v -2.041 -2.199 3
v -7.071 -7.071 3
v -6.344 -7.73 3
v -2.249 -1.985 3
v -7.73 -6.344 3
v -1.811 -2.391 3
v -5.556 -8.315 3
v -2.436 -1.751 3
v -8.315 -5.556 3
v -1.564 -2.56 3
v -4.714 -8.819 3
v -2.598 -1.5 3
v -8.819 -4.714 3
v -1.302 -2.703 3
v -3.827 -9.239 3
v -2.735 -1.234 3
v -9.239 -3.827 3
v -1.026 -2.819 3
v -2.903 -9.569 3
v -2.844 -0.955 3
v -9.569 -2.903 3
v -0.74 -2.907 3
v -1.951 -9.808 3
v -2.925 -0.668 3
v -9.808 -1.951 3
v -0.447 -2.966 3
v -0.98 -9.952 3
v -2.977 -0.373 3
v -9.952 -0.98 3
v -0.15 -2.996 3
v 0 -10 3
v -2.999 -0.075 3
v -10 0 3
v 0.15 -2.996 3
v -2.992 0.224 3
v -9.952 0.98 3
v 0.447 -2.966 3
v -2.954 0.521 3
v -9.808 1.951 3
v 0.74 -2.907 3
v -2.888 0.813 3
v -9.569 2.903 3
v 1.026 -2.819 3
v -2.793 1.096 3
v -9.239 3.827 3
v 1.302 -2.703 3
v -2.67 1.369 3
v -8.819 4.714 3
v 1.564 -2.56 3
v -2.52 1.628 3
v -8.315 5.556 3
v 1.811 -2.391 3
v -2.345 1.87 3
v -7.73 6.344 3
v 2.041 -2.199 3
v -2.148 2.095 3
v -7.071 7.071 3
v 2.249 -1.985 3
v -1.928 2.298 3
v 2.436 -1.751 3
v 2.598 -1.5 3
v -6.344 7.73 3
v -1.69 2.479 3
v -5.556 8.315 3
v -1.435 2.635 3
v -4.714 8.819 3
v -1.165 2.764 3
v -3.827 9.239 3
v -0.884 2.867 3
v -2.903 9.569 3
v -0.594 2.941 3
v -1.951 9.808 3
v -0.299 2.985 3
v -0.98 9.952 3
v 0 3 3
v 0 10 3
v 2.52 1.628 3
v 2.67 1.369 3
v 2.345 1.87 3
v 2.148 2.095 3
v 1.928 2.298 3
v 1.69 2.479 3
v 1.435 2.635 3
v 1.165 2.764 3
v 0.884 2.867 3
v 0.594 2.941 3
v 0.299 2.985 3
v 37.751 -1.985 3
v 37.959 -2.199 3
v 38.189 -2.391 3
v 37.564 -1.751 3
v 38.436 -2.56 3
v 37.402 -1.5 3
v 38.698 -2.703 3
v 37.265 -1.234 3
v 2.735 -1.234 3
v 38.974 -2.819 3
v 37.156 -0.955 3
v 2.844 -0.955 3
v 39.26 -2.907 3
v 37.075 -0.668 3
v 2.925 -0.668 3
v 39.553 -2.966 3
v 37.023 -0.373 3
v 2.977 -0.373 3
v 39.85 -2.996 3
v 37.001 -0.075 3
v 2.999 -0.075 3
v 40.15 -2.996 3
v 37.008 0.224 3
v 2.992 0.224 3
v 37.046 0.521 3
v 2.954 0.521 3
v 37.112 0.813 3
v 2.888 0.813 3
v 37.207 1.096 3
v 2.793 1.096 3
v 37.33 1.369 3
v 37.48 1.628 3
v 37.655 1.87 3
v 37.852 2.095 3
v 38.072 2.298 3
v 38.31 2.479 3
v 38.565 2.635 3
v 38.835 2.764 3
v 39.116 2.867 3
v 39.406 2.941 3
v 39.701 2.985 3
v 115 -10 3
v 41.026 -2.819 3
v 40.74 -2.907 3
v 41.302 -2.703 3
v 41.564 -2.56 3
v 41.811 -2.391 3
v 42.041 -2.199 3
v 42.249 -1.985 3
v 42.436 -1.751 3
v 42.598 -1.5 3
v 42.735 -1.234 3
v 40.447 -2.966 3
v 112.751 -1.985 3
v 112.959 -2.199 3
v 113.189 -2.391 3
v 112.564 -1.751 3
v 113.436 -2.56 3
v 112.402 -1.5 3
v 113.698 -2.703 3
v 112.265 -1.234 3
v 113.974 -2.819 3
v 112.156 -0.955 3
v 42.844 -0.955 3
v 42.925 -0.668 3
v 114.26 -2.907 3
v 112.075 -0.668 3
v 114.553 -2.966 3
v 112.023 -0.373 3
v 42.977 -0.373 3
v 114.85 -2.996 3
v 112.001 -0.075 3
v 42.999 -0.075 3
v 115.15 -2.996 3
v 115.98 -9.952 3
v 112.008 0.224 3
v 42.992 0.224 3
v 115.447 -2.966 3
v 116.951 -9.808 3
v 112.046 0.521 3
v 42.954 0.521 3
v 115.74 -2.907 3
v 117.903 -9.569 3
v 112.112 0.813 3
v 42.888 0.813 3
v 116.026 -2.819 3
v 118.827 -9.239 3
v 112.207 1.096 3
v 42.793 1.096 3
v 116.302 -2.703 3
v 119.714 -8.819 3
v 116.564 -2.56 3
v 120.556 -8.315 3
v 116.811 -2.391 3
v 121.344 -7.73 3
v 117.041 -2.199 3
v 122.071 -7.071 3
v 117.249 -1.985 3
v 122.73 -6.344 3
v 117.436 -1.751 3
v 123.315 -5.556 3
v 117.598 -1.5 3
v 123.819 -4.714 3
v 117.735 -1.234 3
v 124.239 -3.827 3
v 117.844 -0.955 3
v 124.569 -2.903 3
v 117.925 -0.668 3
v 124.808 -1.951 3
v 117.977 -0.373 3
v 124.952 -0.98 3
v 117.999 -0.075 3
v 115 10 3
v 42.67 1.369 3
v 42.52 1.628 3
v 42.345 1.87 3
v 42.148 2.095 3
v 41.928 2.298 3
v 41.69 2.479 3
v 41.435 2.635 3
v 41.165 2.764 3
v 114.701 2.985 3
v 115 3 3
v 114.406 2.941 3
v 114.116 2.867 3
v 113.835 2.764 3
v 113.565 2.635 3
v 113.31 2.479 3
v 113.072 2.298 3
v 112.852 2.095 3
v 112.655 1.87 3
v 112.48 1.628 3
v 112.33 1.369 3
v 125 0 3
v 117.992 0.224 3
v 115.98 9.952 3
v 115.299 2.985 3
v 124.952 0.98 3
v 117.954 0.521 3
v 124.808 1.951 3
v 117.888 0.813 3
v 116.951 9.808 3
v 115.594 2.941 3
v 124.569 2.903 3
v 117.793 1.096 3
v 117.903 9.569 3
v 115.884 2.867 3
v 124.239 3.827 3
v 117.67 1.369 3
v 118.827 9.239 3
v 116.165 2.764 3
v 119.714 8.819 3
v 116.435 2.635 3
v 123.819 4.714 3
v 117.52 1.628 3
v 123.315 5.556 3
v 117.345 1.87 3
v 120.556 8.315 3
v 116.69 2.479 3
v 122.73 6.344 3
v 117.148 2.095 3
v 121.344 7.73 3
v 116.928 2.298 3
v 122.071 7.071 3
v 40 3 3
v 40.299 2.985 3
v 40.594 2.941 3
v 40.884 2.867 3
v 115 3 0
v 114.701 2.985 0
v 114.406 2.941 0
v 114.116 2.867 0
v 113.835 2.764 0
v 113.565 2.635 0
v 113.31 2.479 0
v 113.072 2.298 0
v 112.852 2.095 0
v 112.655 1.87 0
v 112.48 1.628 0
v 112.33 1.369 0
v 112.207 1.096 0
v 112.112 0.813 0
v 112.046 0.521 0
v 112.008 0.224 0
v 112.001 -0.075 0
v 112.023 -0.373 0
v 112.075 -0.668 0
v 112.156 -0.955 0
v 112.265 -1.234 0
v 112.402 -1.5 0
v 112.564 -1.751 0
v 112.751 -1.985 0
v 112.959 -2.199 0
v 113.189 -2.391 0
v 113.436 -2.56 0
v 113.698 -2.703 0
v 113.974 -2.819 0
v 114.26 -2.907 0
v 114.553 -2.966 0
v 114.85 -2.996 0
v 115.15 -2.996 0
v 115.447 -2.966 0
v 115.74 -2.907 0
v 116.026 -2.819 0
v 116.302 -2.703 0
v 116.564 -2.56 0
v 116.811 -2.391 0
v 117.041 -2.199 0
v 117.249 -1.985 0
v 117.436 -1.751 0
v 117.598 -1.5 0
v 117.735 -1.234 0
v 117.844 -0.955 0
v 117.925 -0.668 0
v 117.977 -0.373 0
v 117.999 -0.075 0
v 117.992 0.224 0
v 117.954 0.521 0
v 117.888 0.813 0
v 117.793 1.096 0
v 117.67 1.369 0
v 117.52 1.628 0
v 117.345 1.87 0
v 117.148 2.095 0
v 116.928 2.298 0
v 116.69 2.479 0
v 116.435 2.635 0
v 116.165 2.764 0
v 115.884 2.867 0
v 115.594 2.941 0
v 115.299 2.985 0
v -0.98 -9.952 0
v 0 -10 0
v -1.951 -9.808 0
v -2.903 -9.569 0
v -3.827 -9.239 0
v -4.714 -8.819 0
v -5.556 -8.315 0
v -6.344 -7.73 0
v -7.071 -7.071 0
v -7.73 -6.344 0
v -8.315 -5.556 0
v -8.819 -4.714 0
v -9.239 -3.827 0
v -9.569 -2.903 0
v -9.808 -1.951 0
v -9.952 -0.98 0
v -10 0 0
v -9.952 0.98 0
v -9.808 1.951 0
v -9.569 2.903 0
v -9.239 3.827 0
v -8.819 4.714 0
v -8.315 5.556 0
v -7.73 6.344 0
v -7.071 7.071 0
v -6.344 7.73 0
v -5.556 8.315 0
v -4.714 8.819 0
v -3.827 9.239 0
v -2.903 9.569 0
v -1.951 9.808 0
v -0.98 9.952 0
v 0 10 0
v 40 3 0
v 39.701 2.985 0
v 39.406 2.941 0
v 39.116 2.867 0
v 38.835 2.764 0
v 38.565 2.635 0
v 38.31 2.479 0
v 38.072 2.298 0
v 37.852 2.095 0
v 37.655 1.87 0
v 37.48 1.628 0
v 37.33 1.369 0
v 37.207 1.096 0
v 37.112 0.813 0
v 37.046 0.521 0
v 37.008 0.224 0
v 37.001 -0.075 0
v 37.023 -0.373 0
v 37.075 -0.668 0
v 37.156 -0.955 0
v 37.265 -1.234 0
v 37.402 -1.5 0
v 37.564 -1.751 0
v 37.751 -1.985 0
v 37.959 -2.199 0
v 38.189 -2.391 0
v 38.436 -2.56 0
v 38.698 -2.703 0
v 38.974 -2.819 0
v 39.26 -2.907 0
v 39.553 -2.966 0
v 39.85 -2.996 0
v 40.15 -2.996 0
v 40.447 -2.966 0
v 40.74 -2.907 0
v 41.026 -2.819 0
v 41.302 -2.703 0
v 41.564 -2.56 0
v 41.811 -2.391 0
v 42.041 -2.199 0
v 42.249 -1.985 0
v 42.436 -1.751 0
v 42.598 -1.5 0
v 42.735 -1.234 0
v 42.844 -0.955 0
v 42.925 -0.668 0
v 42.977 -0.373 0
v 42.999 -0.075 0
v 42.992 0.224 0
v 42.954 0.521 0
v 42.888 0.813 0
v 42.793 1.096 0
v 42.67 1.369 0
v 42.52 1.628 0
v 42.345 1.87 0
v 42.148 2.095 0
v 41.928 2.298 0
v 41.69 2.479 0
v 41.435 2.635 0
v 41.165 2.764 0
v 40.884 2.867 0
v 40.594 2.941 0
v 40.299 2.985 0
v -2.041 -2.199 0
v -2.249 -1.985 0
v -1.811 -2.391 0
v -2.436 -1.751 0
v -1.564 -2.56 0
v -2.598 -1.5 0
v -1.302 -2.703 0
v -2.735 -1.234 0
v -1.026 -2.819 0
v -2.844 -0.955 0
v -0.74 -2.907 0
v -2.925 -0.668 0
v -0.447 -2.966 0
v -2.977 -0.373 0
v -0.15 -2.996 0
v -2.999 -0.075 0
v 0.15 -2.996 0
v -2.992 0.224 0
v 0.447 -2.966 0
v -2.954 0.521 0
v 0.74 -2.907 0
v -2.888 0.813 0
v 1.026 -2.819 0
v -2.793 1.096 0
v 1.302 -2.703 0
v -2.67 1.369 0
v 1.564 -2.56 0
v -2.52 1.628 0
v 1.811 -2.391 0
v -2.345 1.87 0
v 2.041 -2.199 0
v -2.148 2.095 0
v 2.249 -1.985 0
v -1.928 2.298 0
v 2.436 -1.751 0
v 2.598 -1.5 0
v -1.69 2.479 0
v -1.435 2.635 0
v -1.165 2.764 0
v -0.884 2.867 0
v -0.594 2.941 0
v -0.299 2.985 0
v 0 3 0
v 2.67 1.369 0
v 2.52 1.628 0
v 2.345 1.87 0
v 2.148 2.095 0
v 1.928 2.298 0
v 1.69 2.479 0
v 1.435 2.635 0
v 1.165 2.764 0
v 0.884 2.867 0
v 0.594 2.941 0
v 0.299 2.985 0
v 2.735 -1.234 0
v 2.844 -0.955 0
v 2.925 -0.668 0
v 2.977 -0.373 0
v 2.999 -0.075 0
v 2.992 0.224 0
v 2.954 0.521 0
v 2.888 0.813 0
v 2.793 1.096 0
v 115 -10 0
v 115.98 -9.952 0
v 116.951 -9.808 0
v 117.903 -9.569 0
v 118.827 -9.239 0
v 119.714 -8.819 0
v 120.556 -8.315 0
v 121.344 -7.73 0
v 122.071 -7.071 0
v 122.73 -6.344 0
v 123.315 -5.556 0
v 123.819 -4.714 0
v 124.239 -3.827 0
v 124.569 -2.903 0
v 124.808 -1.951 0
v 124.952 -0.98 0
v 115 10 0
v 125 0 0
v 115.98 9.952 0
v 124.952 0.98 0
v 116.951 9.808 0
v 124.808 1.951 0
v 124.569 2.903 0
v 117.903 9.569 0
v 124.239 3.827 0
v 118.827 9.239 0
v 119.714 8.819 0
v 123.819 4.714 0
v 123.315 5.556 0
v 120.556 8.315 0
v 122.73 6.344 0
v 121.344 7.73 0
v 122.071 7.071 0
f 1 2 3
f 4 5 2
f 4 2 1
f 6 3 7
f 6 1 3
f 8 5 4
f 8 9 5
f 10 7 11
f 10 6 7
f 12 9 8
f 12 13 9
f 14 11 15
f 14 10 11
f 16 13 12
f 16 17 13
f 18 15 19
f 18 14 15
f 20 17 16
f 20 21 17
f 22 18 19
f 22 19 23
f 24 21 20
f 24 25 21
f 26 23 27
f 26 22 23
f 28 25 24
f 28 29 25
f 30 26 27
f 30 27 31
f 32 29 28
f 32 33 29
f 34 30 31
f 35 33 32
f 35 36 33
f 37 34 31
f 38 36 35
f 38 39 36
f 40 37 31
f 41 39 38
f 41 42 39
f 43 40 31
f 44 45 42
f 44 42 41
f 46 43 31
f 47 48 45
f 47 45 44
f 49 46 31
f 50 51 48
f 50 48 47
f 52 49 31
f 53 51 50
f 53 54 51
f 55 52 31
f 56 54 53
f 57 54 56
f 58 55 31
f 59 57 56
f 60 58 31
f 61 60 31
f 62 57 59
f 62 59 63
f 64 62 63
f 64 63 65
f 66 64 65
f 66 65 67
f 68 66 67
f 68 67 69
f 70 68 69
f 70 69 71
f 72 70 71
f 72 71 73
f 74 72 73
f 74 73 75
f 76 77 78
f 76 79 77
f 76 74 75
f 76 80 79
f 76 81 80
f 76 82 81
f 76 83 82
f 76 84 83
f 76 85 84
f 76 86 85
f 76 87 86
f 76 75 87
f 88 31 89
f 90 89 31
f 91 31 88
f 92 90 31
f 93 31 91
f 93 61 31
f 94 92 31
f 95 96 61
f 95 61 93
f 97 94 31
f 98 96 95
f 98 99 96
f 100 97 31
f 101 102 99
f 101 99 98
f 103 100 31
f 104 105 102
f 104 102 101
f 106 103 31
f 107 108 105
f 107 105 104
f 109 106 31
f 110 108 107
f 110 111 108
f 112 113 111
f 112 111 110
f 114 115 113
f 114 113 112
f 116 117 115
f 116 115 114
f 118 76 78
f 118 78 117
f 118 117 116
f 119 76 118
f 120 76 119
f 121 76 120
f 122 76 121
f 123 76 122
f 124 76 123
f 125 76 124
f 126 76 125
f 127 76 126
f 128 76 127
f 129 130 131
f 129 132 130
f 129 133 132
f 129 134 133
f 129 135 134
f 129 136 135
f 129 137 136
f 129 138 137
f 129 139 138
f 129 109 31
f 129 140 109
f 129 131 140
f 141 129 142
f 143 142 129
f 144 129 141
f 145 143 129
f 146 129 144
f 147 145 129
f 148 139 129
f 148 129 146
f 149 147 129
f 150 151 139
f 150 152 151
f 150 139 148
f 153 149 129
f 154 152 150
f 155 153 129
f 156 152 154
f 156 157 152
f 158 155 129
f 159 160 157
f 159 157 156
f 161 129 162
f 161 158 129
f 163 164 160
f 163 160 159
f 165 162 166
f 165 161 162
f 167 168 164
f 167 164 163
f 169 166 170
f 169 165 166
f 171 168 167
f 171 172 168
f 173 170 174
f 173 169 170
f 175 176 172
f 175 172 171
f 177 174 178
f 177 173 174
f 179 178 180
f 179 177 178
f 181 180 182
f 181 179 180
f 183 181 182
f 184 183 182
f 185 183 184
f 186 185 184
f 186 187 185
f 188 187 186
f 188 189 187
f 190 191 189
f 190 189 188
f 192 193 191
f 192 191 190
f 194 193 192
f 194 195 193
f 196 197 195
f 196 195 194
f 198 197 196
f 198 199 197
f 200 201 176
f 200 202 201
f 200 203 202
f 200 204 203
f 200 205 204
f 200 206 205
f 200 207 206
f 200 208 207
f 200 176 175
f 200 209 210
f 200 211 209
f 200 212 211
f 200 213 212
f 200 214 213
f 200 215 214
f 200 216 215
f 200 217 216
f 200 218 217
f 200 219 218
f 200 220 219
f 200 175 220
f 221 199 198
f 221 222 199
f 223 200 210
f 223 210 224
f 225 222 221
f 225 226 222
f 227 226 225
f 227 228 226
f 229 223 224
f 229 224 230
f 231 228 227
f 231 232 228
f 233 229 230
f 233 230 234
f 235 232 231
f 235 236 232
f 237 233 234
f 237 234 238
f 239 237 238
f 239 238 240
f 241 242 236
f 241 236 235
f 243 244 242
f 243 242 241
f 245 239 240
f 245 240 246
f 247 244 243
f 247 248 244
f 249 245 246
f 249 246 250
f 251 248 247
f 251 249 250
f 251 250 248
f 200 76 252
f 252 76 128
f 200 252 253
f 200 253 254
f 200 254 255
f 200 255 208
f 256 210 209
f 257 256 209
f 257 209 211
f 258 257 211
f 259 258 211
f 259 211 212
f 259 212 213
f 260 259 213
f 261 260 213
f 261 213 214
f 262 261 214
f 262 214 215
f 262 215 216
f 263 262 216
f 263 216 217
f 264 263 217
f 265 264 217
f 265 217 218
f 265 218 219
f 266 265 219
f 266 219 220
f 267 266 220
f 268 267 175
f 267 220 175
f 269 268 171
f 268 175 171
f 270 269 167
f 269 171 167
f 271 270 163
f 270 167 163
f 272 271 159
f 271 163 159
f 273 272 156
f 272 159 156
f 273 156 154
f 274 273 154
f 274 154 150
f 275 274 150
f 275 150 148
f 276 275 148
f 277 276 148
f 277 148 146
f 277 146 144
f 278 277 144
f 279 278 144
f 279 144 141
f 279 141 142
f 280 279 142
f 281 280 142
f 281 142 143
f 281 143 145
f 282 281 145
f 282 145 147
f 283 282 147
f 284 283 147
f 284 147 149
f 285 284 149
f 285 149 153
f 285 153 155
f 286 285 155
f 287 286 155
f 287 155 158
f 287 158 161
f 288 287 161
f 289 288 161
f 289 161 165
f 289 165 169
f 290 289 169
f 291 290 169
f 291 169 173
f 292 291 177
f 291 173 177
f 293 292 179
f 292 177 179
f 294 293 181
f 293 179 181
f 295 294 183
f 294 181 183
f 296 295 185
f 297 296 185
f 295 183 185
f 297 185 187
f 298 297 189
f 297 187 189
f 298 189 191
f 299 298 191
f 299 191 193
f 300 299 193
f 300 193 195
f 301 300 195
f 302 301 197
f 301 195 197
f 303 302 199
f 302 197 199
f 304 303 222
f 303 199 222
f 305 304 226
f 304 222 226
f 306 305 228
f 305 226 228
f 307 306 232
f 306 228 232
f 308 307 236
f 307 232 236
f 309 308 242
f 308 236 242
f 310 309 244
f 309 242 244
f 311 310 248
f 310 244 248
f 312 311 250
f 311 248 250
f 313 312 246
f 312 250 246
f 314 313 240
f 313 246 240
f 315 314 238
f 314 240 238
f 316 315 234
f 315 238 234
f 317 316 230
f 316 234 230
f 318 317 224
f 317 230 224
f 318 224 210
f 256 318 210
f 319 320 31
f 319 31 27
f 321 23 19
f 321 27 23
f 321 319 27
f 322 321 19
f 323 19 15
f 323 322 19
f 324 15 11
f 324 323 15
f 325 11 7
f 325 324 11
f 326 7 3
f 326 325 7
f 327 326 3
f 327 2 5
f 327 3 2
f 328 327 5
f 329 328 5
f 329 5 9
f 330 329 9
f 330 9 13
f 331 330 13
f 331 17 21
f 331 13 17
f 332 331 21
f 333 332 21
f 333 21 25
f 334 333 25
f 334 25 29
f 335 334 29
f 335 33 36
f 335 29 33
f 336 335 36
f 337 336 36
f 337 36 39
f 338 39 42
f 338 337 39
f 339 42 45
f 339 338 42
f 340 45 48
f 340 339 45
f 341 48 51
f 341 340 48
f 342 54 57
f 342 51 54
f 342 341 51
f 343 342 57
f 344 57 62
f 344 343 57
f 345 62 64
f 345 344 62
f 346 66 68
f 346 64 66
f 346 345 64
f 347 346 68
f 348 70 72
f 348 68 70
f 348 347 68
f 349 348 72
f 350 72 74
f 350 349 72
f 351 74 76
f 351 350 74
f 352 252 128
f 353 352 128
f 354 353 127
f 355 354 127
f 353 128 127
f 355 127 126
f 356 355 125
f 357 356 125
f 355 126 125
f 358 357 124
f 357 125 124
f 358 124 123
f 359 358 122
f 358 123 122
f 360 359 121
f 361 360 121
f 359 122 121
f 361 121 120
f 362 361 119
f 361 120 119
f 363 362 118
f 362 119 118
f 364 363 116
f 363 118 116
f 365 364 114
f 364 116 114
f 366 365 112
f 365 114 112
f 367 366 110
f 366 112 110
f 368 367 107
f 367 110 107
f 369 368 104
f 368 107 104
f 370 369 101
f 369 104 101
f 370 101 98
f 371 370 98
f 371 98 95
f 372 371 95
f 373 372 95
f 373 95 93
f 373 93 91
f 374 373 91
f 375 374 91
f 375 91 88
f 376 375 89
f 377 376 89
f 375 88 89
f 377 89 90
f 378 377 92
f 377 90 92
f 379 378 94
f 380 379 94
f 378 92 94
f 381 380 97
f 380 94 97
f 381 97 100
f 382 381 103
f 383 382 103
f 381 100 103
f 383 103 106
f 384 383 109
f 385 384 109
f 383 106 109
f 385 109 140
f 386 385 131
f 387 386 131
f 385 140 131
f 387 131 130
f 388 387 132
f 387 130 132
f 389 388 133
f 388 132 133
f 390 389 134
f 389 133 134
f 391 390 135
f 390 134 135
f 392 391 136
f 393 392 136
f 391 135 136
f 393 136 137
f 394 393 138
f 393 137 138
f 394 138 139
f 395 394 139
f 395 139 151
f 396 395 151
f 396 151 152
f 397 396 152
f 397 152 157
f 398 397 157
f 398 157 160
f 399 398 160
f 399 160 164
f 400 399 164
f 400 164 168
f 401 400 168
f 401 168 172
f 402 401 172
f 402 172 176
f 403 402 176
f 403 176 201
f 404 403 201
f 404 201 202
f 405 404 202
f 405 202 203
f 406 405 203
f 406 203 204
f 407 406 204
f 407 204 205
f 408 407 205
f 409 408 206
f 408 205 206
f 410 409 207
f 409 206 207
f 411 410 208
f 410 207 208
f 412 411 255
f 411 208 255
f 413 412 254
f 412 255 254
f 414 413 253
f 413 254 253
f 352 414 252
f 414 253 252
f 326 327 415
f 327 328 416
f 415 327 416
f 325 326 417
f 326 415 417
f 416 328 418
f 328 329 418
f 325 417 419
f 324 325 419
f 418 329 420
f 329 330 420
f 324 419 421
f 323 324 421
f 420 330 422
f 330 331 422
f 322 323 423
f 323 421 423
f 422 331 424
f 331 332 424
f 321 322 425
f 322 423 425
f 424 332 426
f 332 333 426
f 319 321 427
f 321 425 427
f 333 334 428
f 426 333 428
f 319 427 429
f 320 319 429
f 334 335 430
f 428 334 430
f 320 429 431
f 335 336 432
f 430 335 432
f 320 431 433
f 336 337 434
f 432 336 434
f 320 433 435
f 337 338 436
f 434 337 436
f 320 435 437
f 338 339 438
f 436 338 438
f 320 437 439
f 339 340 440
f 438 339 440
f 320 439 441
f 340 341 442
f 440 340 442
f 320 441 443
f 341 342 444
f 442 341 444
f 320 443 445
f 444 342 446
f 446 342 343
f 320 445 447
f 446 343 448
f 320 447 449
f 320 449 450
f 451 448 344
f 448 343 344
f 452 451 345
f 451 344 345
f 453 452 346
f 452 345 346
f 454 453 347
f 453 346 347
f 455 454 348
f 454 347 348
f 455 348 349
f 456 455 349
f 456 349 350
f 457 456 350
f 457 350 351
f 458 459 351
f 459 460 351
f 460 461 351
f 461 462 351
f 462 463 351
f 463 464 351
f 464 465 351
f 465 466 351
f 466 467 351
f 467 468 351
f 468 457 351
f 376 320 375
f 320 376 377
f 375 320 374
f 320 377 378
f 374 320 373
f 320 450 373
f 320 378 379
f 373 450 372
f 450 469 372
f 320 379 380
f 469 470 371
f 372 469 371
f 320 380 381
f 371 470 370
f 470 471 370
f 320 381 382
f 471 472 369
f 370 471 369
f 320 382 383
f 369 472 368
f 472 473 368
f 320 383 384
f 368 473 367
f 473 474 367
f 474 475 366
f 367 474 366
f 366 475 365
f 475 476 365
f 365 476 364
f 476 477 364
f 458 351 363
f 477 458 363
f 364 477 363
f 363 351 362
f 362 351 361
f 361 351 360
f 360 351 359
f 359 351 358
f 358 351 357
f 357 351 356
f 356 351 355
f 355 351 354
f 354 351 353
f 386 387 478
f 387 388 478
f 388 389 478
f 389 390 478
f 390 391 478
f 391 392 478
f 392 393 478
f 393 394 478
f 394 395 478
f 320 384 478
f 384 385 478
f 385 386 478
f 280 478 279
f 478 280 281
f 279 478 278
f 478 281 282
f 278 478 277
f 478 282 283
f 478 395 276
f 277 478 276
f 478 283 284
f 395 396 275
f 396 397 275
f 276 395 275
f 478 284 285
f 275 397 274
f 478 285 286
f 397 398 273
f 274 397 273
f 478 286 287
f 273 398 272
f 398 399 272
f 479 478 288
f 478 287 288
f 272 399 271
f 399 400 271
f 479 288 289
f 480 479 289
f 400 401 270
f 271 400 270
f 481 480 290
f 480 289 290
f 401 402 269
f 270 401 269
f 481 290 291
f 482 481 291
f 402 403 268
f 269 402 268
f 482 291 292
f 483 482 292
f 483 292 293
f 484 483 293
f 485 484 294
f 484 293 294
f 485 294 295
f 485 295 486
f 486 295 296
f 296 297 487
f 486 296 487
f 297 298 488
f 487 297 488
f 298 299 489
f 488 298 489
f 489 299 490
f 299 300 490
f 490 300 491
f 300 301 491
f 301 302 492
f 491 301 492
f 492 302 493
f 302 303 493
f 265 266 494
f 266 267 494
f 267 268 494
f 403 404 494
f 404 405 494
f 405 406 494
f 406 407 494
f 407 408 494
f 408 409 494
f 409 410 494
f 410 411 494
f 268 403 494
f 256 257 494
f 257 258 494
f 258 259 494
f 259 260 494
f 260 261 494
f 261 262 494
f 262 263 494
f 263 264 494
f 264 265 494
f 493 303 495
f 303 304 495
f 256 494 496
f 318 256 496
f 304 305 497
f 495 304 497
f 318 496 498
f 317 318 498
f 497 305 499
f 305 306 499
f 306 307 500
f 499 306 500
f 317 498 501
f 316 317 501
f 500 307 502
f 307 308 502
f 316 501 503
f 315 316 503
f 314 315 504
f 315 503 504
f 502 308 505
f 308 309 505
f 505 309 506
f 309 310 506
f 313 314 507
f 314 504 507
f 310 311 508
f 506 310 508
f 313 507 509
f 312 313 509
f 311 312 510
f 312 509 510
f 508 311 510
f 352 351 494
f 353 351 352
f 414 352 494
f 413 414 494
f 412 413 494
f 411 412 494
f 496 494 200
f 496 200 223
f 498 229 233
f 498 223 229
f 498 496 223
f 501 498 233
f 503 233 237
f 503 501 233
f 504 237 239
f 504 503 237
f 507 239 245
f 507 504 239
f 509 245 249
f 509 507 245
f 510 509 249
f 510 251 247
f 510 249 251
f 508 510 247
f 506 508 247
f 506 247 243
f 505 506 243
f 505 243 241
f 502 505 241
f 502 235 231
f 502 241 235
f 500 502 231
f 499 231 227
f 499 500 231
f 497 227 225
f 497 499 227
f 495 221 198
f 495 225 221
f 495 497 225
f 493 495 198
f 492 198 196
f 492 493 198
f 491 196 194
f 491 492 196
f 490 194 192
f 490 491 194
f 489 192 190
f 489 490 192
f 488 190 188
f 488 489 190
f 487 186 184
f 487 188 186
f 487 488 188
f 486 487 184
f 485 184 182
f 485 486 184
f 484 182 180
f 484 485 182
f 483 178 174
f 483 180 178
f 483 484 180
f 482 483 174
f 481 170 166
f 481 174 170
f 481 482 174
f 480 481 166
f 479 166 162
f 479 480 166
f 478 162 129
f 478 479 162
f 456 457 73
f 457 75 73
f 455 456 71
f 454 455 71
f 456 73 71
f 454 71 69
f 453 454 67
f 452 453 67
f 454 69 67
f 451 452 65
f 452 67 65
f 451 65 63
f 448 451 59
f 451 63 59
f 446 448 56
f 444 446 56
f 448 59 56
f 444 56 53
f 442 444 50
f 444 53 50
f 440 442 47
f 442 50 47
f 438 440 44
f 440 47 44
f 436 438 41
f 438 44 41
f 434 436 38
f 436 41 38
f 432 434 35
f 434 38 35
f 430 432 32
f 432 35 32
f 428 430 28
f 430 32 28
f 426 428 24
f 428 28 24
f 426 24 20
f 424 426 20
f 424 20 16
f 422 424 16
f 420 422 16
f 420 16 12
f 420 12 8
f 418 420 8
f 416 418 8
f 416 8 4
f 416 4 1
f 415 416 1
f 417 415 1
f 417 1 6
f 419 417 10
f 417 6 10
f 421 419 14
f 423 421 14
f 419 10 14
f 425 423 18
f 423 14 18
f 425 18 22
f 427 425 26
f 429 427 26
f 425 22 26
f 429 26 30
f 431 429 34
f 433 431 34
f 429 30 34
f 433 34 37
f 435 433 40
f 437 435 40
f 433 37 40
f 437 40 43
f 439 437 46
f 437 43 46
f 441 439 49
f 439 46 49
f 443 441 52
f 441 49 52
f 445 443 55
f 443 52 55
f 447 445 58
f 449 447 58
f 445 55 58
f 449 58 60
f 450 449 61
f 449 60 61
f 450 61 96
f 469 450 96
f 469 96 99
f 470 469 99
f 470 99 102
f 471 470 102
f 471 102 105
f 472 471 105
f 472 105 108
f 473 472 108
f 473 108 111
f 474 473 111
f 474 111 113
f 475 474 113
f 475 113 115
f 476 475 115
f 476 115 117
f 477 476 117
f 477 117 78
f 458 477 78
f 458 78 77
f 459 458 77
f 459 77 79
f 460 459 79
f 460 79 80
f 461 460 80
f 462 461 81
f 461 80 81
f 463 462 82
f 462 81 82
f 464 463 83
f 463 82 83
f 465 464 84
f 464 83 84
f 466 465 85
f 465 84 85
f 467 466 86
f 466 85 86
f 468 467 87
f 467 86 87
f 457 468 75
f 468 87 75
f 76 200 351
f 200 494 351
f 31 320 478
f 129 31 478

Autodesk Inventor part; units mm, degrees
ref_plane "YZ Plane" through (0, 0, 0) normal (1, 0, 0) x (0, 1, 0)
ref_plane "XZ Plane" through (0, 0, 0) normal (0, 1, 0) x (-1, 0, 0)
ref_plane "XY Plane" through (0, 0, 0) normal (0, 0, 1) x (1, 0, 0)
sketch "Szkic1" plane through (0, 0, 0) normal (0, 0, 1) x (1, 0, 0)
  line L0 (0, 0) -> (115, 0) construction
  line L1 (0, -10) -> (115, -10)
  line L2 (115, 10) -> (0, 10)
  arc A0 (0, 10) -> (0, -10) centre (0, 0) ccw
  arc A1 (115, -10) -> (115, 10) centre (115, 0) ccw
  point P0 (57.5, 0)
  point P1 (40, 0)
  dimension "d0" = 115
  dimension "d1" = 20
  dimension "d2" = 75
extrude "Wyciągnięcie proste1" add sketch "Szkic1" along normal blind 3
hole "Otwór1" at (115, 0, 0) at (40, 0, 0) direction (0, 0, 1) diameter 6 end through all
hole "Otwór2" at (0, 0, 0) direction (0, 0, 1) diameter 6 end through all
properties part number "lacznik_zewn"
